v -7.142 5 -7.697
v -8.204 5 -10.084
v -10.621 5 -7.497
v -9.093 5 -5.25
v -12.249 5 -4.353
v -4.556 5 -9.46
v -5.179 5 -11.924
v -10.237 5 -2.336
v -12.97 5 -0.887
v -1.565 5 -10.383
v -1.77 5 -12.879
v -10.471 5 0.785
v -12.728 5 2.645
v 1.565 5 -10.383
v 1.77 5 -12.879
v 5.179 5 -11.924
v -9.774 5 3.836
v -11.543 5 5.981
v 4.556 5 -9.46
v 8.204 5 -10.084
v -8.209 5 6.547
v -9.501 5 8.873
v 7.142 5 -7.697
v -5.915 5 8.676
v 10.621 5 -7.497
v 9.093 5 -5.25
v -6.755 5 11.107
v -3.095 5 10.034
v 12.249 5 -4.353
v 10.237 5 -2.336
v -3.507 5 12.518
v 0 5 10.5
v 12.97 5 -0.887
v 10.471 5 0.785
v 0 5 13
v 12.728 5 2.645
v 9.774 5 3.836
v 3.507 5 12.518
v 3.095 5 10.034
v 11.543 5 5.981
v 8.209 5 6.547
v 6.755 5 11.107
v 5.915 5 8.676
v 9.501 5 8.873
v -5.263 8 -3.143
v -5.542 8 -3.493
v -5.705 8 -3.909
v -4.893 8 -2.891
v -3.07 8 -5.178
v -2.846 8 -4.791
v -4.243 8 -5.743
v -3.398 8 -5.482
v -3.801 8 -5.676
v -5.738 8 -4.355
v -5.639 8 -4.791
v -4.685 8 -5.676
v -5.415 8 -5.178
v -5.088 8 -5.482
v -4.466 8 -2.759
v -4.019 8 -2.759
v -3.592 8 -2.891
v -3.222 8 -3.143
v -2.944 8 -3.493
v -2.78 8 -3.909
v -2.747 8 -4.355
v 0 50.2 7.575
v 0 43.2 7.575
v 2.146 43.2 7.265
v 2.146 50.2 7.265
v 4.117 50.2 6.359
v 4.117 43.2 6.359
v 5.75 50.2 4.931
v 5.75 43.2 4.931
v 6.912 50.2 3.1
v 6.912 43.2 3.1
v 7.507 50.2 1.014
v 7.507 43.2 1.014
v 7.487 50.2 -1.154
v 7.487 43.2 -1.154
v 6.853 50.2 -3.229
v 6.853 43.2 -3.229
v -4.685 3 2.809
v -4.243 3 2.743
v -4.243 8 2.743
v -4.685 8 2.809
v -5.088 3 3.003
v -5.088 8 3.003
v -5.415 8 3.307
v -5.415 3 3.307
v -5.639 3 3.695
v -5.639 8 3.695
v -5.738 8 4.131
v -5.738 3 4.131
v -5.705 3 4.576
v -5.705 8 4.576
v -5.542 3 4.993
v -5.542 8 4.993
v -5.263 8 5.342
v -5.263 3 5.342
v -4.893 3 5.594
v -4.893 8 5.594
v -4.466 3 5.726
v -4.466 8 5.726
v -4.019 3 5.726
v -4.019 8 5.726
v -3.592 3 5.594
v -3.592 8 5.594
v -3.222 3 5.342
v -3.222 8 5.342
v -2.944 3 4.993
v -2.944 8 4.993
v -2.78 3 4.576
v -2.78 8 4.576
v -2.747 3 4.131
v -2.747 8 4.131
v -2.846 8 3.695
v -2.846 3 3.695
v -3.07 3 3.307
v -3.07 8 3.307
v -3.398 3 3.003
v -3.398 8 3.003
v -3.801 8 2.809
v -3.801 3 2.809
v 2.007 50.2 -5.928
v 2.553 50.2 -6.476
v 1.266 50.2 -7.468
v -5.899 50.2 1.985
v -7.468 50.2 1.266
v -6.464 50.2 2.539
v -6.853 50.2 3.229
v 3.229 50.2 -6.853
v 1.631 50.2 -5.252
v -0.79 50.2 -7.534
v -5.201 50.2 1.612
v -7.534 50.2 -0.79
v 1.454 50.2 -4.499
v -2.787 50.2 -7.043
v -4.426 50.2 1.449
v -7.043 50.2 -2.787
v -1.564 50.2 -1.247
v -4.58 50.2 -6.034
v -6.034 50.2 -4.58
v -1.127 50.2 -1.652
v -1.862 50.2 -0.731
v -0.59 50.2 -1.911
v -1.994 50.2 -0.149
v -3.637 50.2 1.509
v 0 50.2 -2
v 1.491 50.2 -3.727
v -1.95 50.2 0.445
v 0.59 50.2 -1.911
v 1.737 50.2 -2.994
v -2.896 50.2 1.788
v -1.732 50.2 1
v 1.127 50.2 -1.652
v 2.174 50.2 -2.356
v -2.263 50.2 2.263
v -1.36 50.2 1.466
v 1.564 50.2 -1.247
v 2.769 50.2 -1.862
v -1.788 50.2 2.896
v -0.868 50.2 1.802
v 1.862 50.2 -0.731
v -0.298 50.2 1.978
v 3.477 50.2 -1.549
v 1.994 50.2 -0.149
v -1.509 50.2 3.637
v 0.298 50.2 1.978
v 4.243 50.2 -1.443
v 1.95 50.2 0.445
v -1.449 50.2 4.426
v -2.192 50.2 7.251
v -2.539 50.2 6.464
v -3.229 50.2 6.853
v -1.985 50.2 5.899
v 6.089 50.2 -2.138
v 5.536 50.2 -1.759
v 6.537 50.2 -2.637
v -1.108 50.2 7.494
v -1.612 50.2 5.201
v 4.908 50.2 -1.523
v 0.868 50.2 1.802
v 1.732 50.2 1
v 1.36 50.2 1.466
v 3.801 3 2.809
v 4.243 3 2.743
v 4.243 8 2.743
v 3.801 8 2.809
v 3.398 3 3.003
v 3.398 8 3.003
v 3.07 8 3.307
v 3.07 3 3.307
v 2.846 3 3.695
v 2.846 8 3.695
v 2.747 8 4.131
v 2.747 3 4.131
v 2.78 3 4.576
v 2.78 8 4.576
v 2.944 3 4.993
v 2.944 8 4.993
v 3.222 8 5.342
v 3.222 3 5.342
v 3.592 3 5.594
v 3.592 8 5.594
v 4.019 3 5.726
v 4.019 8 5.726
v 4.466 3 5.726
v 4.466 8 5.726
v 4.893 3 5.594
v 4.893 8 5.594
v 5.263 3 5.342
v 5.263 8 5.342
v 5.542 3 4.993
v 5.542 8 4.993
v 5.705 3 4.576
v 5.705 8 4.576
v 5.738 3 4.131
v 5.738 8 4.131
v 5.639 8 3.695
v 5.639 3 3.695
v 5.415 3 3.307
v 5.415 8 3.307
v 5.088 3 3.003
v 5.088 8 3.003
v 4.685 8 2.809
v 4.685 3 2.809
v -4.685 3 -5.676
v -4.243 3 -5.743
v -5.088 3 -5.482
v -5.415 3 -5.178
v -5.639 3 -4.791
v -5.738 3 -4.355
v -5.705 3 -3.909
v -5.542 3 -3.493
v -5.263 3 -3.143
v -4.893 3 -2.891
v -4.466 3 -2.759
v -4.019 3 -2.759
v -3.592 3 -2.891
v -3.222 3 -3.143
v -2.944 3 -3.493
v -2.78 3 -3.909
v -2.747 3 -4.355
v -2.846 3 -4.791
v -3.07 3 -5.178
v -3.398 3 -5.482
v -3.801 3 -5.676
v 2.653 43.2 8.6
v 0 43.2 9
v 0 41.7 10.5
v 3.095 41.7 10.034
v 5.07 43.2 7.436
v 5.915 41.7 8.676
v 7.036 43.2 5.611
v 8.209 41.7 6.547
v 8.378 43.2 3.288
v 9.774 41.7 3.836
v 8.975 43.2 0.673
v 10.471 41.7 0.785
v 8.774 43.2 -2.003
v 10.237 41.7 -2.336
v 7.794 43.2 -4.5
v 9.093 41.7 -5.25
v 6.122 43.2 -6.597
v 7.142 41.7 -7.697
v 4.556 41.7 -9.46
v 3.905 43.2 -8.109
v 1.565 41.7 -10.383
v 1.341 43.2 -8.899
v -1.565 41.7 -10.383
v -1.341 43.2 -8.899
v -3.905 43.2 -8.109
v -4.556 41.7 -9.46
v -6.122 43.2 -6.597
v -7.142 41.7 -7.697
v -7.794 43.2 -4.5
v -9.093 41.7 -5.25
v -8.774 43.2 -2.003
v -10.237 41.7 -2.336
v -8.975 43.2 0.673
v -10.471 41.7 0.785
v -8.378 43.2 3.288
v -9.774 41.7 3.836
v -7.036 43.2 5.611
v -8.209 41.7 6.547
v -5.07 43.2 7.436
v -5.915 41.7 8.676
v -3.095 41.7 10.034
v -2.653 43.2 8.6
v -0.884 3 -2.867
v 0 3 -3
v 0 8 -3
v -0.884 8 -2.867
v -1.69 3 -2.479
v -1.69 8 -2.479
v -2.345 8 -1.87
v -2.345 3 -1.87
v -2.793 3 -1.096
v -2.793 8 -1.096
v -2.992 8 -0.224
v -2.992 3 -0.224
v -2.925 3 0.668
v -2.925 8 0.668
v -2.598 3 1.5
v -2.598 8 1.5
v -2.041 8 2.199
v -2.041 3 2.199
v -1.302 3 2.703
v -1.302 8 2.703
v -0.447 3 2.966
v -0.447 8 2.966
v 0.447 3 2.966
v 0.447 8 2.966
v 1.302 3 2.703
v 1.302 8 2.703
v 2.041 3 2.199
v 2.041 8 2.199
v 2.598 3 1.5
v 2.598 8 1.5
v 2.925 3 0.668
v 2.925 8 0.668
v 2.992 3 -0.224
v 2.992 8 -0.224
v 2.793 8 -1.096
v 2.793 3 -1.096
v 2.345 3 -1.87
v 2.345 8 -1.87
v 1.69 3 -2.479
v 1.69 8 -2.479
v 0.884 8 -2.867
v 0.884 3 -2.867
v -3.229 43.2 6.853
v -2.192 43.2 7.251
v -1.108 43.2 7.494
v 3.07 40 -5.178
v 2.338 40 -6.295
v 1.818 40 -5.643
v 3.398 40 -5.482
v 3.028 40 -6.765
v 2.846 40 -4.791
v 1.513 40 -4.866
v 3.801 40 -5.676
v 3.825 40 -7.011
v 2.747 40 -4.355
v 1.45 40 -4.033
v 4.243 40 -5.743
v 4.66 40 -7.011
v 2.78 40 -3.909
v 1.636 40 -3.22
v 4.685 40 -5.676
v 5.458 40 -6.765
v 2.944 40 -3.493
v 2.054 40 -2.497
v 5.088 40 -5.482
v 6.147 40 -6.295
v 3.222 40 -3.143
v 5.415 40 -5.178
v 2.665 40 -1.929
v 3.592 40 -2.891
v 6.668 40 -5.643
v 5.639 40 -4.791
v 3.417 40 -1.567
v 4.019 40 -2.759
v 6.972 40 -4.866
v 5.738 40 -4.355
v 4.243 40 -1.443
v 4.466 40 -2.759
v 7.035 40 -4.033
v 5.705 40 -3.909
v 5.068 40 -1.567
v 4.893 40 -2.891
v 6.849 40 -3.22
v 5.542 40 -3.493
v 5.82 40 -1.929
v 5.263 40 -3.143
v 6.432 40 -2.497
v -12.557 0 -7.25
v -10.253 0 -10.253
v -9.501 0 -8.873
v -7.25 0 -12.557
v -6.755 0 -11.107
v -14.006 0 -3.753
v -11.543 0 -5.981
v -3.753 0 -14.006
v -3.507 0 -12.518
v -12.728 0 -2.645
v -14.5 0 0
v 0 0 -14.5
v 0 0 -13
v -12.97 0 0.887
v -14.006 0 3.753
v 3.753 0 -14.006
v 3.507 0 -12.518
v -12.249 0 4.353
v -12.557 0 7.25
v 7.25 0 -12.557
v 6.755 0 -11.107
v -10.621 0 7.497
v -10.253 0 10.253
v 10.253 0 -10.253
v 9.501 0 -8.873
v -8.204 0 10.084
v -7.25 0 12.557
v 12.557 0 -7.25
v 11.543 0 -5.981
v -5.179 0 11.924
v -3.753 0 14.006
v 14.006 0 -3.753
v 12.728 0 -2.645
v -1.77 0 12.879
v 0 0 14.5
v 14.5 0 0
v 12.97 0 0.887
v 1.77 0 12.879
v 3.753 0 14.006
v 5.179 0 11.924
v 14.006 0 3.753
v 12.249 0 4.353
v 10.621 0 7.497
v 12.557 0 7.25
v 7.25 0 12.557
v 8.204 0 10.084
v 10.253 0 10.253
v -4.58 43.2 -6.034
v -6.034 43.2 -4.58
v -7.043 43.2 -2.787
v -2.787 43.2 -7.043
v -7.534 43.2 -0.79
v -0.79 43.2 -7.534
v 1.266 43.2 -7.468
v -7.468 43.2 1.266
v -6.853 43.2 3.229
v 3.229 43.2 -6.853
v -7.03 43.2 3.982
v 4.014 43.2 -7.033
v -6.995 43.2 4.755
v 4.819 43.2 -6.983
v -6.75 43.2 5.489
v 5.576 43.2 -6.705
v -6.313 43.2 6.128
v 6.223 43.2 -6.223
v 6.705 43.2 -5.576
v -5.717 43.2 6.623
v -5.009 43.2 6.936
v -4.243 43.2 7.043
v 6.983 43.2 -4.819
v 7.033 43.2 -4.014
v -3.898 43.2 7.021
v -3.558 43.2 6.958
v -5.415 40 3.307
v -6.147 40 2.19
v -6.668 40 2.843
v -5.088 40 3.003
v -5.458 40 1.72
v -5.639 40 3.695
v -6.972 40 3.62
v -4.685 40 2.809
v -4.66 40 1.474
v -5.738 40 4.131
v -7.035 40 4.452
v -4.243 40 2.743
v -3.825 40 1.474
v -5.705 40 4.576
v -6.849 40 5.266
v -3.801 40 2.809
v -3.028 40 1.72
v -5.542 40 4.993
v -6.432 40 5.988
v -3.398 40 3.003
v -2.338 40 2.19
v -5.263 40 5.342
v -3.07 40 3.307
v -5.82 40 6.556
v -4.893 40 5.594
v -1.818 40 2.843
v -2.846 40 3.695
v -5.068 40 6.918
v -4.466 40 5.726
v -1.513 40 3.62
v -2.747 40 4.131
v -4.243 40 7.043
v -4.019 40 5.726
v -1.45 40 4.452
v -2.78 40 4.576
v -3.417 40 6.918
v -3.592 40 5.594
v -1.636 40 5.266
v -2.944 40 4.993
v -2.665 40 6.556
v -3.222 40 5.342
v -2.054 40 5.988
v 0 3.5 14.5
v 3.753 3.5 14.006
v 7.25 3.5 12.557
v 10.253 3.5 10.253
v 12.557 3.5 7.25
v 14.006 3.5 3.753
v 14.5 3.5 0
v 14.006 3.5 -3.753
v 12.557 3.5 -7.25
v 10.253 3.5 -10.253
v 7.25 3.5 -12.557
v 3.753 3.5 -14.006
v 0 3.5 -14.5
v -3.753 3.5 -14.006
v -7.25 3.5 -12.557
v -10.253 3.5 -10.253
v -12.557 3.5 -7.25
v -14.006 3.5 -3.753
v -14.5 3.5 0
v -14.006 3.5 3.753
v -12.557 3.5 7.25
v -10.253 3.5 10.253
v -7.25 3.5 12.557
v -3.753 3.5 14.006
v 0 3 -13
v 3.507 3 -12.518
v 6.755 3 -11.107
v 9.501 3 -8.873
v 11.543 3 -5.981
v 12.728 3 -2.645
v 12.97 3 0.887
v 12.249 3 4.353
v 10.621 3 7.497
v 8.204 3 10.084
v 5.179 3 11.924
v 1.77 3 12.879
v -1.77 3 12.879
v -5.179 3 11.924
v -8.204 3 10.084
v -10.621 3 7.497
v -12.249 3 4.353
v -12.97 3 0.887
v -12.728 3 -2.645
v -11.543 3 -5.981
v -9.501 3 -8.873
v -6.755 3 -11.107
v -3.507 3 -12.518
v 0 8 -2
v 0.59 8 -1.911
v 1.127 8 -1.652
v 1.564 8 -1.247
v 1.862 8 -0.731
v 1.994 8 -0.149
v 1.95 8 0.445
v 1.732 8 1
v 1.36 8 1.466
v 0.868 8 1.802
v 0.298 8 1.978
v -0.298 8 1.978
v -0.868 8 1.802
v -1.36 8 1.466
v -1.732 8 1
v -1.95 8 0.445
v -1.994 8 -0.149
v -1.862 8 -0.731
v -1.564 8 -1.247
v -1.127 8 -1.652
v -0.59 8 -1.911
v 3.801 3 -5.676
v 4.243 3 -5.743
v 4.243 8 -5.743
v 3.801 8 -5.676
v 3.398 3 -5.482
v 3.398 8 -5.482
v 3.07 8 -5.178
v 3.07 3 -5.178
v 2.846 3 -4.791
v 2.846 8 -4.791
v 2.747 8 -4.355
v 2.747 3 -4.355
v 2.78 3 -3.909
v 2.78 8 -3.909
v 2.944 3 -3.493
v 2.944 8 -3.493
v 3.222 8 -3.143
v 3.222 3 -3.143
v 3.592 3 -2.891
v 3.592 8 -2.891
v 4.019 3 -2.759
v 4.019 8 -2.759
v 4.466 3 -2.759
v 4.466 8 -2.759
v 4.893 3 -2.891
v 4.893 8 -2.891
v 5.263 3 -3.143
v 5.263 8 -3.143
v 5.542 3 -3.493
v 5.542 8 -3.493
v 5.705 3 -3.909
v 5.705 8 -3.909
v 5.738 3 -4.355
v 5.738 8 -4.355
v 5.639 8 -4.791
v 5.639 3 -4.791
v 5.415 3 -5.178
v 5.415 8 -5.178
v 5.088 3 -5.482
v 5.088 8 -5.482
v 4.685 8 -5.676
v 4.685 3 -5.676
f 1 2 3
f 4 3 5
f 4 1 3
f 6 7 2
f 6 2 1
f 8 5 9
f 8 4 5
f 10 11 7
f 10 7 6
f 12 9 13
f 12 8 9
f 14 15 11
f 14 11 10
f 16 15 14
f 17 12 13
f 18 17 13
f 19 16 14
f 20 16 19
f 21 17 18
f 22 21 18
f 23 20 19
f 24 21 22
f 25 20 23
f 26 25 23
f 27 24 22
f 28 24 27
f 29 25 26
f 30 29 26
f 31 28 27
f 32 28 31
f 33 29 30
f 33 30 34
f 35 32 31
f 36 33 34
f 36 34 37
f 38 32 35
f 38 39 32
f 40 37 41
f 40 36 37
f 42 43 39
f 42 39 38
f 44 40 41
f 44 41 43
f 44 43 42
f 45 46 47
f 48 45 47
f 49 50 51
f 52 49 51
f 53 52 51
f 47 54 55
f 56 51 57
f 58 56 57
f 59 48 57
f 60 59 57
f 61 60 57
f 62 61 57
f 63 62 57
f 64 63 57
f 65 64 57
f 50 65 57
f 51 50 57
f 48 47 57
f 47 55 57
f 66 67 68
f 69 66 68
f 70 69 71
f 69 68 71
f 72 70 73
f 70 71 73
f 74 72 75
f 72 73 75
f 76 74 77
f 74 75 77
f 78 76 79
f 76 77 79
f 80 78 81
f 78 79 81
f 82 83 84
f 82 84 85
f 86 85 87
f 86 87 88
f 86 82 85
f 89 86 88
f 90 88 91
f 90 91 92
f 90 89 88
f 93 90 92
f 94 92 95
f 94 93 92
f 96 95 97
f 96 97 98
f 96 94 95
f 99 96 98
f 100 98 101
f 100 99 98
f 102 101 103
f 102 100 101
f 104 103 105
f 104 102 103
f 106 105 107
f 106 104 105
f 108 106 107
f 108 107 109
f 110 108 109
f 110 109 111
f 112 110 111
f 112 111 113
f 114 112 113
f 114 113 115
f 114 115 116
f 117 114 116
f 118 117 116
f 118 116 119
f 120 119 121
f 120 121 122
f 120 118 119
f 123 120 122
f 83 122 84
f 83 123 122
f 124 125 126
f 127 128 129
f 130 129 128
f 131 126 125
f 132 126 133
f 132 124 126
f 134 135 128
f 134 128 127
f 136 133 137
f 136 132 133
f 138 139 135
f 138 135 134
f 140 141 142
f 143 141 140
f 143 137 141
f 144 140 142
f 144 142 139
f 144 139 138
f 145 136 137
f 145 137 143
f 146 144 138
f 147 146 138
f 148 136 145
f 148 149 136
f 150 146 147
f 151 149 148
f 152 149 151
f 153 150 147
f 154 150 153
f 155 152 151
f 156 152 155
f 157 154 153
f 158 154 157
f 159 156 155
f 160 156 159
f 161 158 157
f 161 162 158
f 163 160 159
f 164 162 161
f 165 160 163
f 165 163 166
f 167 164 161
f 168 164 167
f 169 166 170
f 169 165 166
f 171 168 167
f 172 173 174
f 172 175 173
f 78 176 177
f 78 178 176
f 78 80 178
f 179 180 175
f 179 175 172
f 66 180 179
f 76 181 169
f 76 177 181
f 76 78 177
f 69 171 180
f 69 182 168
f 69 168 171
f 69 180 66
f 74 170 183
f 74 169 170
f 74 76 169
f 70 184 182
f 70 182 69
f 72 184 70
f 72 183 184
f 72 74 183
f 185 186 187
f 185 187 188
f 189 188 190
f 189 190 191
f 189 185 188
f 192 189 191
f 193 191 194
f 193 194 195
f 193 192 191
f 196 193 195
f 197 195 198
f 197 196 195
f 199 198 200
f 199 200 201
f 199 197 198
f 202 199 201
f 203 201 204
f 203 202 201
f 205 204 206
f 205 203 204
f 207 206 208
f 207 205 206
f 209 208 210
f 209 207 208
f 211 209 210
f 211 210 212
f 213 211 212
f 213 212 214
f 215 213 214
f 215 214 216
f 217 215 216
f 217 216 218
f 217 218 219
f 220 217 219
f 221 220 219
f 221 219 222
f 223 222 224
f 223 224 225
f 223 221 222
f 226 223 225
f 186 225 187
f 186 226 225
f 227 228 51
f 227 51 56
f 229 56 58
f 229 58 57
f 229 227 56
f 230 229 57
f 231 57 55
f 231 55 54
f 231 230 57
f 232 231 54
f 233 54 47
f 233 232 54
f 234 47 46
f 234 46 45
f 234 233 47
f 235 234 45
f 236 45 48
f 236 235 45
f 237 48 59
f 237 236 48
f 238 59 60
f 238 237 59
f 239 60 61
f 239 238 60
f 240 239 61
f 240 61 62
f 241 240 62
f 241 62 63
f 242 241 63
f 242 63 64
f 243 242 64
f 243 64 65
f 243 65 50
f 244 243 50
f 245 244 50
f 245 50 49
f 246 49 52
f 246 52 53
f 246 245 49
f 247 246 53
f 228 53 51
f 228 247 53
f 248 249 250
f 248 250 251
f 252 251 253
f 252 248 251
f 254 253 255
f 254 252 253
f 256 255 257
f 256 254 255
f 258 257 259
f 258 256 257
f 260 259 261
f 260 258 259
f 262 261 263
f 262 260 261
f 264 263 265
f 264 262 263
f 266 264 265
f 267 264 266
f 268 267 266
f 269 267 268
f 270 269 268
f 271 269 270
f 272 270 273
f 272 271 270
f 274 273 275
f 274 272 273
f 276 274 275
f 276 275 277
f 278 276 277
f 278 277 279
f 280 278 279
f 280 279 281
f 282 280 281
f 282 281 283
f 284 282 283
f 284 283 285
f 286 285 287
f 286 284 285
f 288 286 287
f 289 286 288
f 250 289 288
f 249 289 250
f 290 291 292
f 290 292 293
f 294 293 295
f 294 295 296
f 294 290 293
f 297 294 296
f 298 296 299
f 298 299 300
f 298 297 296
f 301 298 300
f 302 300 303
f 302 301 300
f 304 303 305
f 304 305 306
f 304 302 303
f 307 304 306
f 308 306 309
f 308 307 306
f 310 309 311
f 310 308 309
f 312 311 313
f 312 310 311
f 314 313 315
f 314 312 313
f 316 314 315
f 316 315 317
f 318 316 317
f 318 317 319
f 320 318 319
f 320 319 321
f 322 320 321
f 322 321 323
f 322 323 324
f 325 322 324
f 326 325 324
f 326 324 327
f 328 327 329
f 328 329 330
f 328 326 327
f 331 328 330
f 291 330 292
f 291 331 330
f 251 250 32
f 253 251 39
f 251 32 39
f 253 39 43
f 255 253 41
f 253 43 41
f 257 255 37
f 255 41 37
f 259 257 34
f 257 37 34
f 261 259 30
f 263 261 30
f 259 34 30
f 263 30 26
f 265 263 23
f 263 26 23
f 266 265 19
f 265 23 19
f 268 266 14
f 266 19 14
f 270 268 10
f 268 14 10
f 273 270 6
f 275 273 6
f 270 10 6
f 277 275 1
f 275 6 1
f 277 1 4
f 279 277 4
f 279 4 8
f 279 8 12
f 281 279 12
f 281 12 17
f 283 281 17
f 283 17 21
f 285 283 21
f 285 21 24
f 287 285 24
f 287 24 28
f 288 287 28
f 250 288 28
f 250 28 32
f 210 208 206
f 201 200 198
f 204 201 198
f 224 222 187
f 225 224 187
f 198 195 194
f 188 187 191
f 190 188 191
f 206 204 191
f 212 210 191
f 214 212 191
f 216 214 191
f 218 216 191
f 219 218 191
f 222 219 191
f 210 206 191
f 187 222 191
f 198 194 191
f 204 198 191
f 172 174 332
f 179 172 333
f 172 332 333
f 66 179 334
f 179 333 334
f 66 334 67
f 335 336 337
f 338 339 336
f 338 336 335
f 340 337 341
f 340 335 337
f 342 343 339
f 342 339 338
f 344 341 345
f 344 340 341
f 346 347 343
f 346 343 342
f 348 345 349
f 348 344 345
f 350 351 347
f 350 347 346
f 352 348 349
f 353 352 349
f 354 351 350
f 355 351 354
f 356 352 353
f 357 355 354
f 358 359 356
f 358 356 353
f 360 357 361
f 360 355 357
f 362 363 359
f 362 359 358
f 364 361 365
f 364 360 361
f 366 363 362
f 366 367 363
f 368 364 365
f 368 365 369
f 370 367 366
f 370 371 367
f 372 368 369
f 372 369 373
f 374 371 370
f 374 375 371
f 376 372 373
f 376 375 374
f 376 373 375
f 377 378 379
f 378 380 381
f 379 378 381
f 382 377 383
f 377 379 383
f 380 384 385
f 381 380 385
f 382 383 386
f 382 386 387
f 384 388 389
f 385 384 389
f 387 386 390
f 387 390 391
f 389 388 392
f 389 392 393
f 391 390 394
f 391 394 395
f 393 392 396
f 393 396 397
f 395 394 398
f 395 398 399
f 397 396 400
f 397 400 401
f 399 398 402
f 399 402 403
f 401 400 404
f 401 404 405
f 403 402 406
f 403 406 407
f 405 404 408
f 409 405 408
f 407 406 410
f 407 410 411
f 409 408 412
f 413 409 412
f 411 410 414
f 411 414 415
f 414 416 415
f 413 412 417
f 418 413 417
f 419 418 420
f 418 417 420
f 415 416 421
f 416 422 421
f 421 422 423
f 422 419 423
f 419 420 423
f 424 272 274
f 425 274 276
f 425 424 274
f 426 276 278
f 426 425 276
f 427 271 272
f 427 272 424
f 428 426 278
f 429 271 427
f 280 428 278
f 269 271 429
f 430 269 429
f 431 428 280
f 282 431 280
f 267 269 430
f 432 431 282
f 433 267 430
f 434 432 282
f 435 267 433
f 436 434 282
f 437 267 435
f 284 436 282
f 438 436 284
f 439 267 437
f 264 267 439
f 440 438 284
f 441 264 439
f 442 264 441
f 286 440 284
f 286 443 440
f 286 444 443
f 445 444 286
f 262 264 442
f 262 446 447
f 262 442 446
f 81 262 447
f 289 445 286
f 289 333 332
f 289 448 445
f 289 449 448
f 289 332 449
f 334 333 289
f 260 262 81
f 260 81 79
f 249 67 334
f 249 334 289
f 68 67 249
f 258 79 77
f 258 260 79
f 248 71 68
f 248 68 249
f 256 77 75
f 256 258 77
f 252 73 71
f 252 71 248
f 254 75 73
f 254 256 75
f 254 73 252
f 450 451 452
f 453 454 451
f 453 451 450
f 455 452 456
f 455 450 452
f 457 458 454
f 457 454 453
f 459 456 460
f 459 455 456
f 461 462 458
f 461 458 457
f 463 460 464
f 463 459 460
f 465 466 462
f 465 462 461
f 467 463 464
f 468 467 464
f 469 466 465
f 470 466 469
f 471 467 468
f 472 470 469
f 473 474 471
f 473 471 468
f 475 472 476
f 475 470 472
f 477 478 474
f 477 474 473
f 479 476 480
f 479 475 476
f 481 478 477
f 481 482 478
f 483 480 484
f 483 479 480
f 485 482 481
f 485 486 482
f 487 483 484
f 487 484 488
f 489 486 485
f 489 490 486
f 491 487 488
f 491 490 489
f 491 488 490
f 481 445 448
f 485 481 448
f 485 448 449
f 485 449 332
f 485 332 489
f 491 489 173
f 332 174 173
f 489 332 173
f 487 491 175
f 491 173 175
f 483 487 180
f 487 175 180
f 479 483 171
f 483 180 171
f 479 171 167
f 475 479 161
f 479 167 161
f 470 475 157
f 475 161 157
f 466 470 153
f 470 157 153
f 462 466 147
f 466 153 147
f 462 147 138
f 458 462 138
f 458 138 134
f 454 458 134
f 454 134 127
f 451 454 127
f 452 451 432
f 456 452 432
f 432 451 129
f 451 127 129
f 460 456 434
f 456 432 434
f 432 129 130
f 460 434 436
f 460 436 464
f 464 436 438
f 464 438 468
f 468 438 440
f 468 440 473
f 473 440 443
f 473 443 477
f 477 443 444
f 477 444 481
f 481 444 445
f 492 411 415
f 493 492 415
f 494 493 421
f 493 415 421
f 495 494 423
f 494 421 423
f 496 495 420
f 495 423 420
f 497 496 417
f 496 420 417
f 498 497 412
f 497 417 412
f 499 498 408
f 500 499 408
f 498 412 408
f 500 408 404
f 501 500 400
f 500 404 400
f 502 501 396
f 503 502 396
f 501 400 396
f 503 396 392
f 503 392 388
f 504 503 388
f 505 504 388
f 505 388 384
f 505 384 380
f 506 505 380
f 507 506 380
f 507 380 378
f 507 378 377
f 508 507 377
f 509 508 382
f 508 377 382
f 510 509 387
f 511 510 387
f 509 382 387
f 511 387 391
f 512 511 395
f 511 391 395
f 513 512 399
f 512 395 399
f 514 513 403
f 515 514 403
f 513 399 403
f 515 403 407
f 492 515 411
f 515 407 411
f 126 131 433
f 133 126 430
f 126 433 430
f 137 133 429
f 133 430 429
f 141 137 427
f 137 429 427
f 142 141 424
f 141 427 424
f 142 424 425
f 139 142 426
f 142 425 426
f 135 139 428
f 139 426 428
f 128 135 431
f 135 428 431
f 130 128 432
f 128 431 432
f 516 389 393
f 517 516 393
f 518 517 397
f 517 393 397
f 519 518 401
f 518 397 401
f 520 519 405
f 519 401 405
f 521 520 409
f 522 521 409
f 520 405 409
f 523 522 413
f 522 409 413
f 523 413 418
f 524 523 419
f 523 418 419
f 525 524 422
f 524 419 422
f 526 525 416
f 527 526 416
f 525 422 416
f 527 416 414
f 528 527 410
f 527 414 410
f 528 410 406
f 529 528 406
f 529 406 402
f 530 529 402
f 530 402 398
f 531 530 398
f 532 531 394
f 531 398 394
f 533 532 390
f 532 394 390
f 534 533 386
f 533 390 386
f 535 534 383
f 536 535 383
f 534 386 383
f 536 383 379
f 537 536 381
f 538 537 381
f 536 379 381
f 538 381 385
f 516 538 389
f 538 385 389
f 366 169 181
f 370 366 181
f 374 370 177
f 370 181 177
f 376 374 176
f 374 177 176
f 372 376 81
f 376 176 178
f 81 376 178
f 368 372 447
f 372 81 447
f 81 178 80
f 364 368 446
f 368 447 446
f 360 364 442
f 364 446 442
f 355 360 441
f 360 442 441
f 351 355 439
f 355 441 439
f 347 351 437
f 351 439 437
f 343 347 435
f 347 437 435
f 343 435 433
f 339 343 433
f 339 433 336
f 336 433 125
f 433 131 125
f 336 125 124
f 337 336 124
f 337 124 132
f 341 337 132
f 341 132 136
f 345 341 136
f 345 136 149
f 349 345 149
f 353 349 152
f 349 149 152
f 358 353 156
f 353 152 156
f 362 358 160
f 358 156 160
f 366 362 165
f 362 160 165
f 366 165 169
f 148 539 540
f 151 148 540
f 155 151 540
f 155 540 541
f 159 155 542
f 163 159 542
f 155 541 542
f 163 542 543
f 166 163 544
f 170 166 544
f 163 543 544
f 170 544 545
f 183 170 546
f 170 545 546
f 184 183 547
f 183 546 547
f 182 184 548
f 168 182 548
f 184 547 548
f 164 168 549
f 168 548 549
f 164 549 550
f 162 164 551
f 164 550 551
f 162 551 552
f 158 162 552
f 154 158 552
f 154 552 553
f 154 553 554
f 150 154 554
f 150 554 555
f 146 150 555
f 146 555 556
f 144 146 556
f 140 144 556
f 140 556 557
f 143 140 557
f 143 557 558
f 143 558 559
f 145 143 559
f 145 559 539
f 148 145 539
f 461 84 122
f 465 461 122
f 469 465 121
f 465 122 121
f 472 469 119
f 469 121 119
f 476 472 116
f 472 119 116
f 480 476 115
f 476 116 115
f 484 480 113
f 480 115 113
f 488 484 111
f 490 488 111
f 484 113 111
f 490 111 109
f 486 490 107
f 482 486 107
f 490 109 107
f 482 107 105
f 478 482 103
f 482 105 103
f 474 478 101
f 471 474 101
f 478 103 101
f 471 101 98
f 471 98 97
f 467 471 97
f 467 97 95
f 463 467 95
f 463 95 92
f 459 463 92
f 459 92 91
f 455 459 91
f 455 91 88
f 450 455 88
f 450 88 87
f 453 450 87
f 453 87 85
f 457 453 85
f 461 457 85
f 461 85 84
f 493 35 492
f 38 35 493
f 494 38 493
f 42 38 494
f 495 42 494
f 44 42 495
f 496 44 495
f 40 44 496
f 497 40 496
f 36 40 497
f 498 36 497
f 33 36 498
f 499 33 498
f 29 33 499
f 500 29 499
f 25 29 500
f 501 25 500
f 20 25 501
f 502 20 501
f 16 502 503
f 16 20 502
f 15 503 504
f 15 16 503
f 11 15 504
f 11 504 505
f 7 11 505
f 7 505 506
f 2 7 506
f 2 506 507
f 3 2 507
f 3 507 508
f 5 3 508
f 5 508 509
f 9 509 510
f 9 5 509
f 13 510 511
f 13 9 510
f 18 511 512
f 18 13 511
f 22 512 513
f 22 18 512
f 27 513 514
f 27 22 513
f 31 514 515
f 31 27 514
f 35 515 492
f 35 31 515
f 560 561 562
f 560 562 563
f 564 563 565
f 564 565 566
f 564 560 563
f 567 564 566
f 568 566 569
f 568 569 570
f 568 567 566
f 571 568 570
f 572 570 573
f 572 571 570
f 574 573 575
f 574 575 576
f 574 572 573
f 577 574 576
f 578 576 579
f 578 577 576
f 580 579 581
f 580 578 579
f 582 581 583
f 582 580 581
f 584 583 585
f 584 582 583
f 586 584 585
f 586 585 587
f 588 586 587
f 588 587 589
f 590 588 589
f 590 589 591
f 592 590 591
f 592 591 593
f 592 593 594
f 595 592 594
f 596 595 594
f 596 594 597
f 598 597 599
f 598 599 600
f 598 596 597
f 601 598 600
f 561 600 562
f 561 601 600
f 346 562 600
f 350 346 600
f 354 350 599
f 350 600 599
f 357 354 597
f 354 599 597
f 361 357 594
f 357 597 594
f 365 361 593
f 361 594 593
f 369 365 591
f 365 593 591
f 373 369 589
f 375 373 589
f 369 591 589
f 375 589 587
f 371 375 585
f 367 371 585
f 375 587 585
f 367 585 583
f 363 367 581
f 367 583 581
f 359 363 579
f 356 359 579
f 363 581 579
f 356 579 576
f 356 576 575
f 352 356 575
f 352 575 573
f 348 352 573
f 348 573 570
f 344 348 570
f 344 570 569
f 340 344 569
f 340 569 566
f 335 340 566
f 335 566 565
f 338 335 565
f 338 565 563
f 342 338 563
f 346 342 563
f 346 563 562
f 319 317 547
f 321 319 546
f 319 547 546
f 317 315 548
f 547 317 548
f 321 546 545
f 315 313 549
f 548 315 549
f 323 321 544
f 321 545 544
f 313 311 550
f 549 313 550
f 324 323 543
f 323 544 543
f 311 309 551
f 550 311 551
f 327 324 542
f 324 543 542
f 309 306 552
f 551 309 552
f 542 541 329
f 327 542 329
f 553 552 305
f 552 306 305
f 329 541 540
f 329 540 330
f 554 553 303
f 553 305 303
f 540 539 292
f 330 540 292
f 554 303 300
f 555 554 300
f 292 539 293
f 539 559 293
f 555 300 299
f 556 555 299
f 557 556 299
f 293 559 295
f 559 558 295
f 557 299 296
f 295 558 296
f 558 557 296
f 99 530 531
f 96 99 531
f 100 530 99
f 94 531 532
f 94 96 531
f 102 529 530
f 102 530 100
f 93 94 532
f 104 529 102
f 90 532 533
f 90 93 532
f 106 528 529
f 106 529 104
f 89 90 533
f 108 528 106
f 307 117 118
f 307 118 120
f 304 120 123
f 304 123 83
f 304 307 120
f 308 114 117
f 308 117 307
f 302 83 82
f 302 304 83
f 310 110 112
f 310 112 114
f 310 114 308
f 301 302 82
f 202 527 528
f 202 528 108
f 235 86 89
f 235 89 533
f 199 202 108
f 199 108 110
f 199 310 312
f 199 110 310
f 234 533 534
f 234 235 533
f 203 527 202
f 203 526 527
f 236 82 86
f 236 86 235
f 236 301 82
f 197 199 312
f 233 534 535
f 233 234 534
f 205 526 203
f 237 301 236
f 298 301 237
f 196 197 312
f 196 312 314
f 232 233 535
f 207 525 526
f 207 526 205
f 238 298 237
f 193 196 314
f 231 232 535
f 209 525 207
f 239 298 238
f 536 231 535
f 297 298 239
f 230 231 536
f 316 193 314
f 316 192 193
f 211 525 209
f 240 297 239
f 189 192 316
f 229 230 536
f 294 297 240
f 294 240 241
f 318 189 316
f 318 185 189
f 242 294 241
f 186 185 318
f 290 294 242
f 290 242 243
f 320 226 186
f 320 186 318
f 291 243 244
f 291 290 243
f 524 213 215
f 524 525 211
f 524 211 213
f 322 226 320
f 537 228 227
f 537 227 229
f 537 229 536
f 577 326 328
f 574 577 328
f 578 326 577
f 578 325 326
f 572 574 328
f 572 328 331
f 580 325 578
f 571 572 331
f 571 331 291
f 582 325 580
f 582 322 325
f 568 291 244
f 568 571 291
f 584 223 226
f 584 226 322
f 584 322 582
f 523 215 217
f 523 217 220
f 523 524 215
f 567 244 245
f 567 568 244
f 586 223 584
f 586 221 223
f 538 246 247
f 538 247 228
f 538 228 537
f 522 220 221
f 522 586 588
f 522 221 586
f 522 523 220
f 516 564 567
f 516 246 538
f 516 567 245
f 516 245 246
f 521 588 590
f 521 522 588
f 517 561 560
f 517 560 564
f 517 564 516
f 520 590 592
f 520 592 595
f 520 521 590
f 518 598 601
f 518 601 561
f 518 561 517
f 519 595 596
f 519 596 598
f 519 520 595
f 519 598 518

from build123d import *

# Parameters (mm, degrees)
SKETCH1_R              = 14.5
BOSS_EXTRUDE1_DEPTH    = 5
SKETCH2_R              = 13
CUT_EXTRUDE1_DEPTH     = 3
SKETCH6_R              = 10.5
BOSS_EXTRUDE3_DEPTH    = 45.2
CUT_EXTRUDE2_START     = -2
SKETCH3_R              = 3
SKETCH3_R_2            = 1.5
CUT_EXTRUDE2_DEPTH     = 5
BEARING_START          = -7
SKETCH7_R              = 10.5
SKETCH7_R_2            = 7.575
BEARING_SUPPORT_DEPTH  = 7
SKETCH8_R              = 2
SKETCH8_R_2            = 1.5
M4_HOLE_BORE_DEPTH     = 52.462024834
SKETCH9_R              = 2.8
M3_BOLT_RECESSES_DEPTH = 10.2
CHAMFER1_SIZE          = 1.5


with BuildPart() as part:
    # Sketch1 → Boss-Extrude1 (new body)
    with BuildSketch(Plane(origin=(0, 0, 0), x_dir=(1, 0, 0), z_dir=(0, 1, 0))):
        with Locations(Location((0, 0, 0), (0, 0, 270))):
            Circle(SKETCH1_R)
    extrude(amount=BOSS_EXTRUDE1_DEPTH)

    # Sketch2 → Cut-Extrude1 (cut)
    with BuildSketch(Plane.XZ):
        with Locations(Location((0, 0, 0), (0, 0, 270))):
            Circle(SKETCH2_R)
    extrude(amount=-CUT_EXTRUDE1_DEPTH, mode=Mode.SUBTRACT)

    # Sketch6 → Boss-Extrude3 (add)
    with BuildSketch(Plane(origin=(0, 5, 0), x_dir=(1, 0, 0), z_dir=(0, 1, 0))):
        with Locations(Location((0, 0, 0), (0, 0, 270))):
            Circle(SKETCH6_R)
    extrude(amount=BOSS_EXTRUDE3_DEPTH)

    # Sketch3 → Cut-Extrude2 (cut)
    with BuildSketch(Plane(origin=(0, 5, 0), x_dir=(1, 0, 0), z_dir=(0, 1, 0)).offset(CUT_EXTRUDE2_START)):
        with Locations(Location((0, 0, 0), (0, 0, 90))):
            Circle(SKETCH3_R)
        with Locations(Location((-4.242640687, 4.242640687, 0), (0, 0, 90))):
            Circle(SKETCH3_R_2)
        with Locations(Location((4.242640687, 4.242640687, 0), (0, 0, 90))):
            Circle(SKETCH3_R_2)
        with Locations(Location((4.242640687, -4.242640687, 0), (0, 0, 90))):
            Circle(SKETCH3_R_2)
        with Locations(Location((-4.242640687, -4.242640687, 0), (0, 0, 90))):
            Circle(SKETCH3_R_2)
    extrude(amount=CUT_EXTRUDE2_DEPTH, mode=Mode.SUBTRACT)

    # Sketch7 → Bearing Support (cut)
    with BuildSketch(Plane(origin=(0, 50.2, 0), x_dir=(1, 0, 0), z_dir=(0, 1, 0)).offset(BEARING_START)):
        with Locations(Location((0, 0, 0), (0, 0, 270))):
            Circle(SKETCH7_R)
        with Locations(Location((0, 0, 0), (0, 0, 270))):
            Circle(SKETCH7_R_2, mode=Mode.SUBTRACT)
    extrude(amount=BEARING_SUPPORT_DEPTH, mode=Mode.SUBTRACT)

    # Sketch8 → M4 Hole Bore (cut, through all)
    with BuildSketch(Plane.XZ.offset(-3)):
        with Locations(Location((0, 0, 0), (0, 0, 270))):
            Circle(SKETCH8_R)
        with Locations(Location((-4.242640687, 4.242640687, 0), (0, 0, 270))):
            Circle(SKETCH8_R_2)
        with Locations(Location((4.242640687, -4.242640687, 0), (0, 0, 270))):
            Circle(SKETCH8_R_2)
    extrude(amount=-M4_HOLE_BORE_DEPTH, mode=Mode.SUBTRACT)

    # Sketch9 → M3 Bolt Recesses (cut)
    with BuildSketch(Plane(origin=(0, 50.2, 0), x_dir=(1, 0, 0), z_dir=(0, 1, 0))):
        with Locations(Location((4.242640687, 4.242640687, 0), (0, 0, 270))):
            Circle(SKETCH9_R)
        with Locations(Location((-4.242640687, -4.242640687, 0), (0, 0, 270))):
            Circle(SKETCH9_R)
    extrude(amount=-M3_BOLT_RECESSES_DEPTH, mode=Mode.SUBTRACT)

    # Chamfer1
    chamfer1_edges = [part.edges().sort_by_distance(p)[0] for p in [
        (0, 43.2, -10.5),
        (0, 5, -14.5),
    ]]
    chamfer(chamfer1_edges, length=CHAMFER1_SIZE)


solid = part.part
